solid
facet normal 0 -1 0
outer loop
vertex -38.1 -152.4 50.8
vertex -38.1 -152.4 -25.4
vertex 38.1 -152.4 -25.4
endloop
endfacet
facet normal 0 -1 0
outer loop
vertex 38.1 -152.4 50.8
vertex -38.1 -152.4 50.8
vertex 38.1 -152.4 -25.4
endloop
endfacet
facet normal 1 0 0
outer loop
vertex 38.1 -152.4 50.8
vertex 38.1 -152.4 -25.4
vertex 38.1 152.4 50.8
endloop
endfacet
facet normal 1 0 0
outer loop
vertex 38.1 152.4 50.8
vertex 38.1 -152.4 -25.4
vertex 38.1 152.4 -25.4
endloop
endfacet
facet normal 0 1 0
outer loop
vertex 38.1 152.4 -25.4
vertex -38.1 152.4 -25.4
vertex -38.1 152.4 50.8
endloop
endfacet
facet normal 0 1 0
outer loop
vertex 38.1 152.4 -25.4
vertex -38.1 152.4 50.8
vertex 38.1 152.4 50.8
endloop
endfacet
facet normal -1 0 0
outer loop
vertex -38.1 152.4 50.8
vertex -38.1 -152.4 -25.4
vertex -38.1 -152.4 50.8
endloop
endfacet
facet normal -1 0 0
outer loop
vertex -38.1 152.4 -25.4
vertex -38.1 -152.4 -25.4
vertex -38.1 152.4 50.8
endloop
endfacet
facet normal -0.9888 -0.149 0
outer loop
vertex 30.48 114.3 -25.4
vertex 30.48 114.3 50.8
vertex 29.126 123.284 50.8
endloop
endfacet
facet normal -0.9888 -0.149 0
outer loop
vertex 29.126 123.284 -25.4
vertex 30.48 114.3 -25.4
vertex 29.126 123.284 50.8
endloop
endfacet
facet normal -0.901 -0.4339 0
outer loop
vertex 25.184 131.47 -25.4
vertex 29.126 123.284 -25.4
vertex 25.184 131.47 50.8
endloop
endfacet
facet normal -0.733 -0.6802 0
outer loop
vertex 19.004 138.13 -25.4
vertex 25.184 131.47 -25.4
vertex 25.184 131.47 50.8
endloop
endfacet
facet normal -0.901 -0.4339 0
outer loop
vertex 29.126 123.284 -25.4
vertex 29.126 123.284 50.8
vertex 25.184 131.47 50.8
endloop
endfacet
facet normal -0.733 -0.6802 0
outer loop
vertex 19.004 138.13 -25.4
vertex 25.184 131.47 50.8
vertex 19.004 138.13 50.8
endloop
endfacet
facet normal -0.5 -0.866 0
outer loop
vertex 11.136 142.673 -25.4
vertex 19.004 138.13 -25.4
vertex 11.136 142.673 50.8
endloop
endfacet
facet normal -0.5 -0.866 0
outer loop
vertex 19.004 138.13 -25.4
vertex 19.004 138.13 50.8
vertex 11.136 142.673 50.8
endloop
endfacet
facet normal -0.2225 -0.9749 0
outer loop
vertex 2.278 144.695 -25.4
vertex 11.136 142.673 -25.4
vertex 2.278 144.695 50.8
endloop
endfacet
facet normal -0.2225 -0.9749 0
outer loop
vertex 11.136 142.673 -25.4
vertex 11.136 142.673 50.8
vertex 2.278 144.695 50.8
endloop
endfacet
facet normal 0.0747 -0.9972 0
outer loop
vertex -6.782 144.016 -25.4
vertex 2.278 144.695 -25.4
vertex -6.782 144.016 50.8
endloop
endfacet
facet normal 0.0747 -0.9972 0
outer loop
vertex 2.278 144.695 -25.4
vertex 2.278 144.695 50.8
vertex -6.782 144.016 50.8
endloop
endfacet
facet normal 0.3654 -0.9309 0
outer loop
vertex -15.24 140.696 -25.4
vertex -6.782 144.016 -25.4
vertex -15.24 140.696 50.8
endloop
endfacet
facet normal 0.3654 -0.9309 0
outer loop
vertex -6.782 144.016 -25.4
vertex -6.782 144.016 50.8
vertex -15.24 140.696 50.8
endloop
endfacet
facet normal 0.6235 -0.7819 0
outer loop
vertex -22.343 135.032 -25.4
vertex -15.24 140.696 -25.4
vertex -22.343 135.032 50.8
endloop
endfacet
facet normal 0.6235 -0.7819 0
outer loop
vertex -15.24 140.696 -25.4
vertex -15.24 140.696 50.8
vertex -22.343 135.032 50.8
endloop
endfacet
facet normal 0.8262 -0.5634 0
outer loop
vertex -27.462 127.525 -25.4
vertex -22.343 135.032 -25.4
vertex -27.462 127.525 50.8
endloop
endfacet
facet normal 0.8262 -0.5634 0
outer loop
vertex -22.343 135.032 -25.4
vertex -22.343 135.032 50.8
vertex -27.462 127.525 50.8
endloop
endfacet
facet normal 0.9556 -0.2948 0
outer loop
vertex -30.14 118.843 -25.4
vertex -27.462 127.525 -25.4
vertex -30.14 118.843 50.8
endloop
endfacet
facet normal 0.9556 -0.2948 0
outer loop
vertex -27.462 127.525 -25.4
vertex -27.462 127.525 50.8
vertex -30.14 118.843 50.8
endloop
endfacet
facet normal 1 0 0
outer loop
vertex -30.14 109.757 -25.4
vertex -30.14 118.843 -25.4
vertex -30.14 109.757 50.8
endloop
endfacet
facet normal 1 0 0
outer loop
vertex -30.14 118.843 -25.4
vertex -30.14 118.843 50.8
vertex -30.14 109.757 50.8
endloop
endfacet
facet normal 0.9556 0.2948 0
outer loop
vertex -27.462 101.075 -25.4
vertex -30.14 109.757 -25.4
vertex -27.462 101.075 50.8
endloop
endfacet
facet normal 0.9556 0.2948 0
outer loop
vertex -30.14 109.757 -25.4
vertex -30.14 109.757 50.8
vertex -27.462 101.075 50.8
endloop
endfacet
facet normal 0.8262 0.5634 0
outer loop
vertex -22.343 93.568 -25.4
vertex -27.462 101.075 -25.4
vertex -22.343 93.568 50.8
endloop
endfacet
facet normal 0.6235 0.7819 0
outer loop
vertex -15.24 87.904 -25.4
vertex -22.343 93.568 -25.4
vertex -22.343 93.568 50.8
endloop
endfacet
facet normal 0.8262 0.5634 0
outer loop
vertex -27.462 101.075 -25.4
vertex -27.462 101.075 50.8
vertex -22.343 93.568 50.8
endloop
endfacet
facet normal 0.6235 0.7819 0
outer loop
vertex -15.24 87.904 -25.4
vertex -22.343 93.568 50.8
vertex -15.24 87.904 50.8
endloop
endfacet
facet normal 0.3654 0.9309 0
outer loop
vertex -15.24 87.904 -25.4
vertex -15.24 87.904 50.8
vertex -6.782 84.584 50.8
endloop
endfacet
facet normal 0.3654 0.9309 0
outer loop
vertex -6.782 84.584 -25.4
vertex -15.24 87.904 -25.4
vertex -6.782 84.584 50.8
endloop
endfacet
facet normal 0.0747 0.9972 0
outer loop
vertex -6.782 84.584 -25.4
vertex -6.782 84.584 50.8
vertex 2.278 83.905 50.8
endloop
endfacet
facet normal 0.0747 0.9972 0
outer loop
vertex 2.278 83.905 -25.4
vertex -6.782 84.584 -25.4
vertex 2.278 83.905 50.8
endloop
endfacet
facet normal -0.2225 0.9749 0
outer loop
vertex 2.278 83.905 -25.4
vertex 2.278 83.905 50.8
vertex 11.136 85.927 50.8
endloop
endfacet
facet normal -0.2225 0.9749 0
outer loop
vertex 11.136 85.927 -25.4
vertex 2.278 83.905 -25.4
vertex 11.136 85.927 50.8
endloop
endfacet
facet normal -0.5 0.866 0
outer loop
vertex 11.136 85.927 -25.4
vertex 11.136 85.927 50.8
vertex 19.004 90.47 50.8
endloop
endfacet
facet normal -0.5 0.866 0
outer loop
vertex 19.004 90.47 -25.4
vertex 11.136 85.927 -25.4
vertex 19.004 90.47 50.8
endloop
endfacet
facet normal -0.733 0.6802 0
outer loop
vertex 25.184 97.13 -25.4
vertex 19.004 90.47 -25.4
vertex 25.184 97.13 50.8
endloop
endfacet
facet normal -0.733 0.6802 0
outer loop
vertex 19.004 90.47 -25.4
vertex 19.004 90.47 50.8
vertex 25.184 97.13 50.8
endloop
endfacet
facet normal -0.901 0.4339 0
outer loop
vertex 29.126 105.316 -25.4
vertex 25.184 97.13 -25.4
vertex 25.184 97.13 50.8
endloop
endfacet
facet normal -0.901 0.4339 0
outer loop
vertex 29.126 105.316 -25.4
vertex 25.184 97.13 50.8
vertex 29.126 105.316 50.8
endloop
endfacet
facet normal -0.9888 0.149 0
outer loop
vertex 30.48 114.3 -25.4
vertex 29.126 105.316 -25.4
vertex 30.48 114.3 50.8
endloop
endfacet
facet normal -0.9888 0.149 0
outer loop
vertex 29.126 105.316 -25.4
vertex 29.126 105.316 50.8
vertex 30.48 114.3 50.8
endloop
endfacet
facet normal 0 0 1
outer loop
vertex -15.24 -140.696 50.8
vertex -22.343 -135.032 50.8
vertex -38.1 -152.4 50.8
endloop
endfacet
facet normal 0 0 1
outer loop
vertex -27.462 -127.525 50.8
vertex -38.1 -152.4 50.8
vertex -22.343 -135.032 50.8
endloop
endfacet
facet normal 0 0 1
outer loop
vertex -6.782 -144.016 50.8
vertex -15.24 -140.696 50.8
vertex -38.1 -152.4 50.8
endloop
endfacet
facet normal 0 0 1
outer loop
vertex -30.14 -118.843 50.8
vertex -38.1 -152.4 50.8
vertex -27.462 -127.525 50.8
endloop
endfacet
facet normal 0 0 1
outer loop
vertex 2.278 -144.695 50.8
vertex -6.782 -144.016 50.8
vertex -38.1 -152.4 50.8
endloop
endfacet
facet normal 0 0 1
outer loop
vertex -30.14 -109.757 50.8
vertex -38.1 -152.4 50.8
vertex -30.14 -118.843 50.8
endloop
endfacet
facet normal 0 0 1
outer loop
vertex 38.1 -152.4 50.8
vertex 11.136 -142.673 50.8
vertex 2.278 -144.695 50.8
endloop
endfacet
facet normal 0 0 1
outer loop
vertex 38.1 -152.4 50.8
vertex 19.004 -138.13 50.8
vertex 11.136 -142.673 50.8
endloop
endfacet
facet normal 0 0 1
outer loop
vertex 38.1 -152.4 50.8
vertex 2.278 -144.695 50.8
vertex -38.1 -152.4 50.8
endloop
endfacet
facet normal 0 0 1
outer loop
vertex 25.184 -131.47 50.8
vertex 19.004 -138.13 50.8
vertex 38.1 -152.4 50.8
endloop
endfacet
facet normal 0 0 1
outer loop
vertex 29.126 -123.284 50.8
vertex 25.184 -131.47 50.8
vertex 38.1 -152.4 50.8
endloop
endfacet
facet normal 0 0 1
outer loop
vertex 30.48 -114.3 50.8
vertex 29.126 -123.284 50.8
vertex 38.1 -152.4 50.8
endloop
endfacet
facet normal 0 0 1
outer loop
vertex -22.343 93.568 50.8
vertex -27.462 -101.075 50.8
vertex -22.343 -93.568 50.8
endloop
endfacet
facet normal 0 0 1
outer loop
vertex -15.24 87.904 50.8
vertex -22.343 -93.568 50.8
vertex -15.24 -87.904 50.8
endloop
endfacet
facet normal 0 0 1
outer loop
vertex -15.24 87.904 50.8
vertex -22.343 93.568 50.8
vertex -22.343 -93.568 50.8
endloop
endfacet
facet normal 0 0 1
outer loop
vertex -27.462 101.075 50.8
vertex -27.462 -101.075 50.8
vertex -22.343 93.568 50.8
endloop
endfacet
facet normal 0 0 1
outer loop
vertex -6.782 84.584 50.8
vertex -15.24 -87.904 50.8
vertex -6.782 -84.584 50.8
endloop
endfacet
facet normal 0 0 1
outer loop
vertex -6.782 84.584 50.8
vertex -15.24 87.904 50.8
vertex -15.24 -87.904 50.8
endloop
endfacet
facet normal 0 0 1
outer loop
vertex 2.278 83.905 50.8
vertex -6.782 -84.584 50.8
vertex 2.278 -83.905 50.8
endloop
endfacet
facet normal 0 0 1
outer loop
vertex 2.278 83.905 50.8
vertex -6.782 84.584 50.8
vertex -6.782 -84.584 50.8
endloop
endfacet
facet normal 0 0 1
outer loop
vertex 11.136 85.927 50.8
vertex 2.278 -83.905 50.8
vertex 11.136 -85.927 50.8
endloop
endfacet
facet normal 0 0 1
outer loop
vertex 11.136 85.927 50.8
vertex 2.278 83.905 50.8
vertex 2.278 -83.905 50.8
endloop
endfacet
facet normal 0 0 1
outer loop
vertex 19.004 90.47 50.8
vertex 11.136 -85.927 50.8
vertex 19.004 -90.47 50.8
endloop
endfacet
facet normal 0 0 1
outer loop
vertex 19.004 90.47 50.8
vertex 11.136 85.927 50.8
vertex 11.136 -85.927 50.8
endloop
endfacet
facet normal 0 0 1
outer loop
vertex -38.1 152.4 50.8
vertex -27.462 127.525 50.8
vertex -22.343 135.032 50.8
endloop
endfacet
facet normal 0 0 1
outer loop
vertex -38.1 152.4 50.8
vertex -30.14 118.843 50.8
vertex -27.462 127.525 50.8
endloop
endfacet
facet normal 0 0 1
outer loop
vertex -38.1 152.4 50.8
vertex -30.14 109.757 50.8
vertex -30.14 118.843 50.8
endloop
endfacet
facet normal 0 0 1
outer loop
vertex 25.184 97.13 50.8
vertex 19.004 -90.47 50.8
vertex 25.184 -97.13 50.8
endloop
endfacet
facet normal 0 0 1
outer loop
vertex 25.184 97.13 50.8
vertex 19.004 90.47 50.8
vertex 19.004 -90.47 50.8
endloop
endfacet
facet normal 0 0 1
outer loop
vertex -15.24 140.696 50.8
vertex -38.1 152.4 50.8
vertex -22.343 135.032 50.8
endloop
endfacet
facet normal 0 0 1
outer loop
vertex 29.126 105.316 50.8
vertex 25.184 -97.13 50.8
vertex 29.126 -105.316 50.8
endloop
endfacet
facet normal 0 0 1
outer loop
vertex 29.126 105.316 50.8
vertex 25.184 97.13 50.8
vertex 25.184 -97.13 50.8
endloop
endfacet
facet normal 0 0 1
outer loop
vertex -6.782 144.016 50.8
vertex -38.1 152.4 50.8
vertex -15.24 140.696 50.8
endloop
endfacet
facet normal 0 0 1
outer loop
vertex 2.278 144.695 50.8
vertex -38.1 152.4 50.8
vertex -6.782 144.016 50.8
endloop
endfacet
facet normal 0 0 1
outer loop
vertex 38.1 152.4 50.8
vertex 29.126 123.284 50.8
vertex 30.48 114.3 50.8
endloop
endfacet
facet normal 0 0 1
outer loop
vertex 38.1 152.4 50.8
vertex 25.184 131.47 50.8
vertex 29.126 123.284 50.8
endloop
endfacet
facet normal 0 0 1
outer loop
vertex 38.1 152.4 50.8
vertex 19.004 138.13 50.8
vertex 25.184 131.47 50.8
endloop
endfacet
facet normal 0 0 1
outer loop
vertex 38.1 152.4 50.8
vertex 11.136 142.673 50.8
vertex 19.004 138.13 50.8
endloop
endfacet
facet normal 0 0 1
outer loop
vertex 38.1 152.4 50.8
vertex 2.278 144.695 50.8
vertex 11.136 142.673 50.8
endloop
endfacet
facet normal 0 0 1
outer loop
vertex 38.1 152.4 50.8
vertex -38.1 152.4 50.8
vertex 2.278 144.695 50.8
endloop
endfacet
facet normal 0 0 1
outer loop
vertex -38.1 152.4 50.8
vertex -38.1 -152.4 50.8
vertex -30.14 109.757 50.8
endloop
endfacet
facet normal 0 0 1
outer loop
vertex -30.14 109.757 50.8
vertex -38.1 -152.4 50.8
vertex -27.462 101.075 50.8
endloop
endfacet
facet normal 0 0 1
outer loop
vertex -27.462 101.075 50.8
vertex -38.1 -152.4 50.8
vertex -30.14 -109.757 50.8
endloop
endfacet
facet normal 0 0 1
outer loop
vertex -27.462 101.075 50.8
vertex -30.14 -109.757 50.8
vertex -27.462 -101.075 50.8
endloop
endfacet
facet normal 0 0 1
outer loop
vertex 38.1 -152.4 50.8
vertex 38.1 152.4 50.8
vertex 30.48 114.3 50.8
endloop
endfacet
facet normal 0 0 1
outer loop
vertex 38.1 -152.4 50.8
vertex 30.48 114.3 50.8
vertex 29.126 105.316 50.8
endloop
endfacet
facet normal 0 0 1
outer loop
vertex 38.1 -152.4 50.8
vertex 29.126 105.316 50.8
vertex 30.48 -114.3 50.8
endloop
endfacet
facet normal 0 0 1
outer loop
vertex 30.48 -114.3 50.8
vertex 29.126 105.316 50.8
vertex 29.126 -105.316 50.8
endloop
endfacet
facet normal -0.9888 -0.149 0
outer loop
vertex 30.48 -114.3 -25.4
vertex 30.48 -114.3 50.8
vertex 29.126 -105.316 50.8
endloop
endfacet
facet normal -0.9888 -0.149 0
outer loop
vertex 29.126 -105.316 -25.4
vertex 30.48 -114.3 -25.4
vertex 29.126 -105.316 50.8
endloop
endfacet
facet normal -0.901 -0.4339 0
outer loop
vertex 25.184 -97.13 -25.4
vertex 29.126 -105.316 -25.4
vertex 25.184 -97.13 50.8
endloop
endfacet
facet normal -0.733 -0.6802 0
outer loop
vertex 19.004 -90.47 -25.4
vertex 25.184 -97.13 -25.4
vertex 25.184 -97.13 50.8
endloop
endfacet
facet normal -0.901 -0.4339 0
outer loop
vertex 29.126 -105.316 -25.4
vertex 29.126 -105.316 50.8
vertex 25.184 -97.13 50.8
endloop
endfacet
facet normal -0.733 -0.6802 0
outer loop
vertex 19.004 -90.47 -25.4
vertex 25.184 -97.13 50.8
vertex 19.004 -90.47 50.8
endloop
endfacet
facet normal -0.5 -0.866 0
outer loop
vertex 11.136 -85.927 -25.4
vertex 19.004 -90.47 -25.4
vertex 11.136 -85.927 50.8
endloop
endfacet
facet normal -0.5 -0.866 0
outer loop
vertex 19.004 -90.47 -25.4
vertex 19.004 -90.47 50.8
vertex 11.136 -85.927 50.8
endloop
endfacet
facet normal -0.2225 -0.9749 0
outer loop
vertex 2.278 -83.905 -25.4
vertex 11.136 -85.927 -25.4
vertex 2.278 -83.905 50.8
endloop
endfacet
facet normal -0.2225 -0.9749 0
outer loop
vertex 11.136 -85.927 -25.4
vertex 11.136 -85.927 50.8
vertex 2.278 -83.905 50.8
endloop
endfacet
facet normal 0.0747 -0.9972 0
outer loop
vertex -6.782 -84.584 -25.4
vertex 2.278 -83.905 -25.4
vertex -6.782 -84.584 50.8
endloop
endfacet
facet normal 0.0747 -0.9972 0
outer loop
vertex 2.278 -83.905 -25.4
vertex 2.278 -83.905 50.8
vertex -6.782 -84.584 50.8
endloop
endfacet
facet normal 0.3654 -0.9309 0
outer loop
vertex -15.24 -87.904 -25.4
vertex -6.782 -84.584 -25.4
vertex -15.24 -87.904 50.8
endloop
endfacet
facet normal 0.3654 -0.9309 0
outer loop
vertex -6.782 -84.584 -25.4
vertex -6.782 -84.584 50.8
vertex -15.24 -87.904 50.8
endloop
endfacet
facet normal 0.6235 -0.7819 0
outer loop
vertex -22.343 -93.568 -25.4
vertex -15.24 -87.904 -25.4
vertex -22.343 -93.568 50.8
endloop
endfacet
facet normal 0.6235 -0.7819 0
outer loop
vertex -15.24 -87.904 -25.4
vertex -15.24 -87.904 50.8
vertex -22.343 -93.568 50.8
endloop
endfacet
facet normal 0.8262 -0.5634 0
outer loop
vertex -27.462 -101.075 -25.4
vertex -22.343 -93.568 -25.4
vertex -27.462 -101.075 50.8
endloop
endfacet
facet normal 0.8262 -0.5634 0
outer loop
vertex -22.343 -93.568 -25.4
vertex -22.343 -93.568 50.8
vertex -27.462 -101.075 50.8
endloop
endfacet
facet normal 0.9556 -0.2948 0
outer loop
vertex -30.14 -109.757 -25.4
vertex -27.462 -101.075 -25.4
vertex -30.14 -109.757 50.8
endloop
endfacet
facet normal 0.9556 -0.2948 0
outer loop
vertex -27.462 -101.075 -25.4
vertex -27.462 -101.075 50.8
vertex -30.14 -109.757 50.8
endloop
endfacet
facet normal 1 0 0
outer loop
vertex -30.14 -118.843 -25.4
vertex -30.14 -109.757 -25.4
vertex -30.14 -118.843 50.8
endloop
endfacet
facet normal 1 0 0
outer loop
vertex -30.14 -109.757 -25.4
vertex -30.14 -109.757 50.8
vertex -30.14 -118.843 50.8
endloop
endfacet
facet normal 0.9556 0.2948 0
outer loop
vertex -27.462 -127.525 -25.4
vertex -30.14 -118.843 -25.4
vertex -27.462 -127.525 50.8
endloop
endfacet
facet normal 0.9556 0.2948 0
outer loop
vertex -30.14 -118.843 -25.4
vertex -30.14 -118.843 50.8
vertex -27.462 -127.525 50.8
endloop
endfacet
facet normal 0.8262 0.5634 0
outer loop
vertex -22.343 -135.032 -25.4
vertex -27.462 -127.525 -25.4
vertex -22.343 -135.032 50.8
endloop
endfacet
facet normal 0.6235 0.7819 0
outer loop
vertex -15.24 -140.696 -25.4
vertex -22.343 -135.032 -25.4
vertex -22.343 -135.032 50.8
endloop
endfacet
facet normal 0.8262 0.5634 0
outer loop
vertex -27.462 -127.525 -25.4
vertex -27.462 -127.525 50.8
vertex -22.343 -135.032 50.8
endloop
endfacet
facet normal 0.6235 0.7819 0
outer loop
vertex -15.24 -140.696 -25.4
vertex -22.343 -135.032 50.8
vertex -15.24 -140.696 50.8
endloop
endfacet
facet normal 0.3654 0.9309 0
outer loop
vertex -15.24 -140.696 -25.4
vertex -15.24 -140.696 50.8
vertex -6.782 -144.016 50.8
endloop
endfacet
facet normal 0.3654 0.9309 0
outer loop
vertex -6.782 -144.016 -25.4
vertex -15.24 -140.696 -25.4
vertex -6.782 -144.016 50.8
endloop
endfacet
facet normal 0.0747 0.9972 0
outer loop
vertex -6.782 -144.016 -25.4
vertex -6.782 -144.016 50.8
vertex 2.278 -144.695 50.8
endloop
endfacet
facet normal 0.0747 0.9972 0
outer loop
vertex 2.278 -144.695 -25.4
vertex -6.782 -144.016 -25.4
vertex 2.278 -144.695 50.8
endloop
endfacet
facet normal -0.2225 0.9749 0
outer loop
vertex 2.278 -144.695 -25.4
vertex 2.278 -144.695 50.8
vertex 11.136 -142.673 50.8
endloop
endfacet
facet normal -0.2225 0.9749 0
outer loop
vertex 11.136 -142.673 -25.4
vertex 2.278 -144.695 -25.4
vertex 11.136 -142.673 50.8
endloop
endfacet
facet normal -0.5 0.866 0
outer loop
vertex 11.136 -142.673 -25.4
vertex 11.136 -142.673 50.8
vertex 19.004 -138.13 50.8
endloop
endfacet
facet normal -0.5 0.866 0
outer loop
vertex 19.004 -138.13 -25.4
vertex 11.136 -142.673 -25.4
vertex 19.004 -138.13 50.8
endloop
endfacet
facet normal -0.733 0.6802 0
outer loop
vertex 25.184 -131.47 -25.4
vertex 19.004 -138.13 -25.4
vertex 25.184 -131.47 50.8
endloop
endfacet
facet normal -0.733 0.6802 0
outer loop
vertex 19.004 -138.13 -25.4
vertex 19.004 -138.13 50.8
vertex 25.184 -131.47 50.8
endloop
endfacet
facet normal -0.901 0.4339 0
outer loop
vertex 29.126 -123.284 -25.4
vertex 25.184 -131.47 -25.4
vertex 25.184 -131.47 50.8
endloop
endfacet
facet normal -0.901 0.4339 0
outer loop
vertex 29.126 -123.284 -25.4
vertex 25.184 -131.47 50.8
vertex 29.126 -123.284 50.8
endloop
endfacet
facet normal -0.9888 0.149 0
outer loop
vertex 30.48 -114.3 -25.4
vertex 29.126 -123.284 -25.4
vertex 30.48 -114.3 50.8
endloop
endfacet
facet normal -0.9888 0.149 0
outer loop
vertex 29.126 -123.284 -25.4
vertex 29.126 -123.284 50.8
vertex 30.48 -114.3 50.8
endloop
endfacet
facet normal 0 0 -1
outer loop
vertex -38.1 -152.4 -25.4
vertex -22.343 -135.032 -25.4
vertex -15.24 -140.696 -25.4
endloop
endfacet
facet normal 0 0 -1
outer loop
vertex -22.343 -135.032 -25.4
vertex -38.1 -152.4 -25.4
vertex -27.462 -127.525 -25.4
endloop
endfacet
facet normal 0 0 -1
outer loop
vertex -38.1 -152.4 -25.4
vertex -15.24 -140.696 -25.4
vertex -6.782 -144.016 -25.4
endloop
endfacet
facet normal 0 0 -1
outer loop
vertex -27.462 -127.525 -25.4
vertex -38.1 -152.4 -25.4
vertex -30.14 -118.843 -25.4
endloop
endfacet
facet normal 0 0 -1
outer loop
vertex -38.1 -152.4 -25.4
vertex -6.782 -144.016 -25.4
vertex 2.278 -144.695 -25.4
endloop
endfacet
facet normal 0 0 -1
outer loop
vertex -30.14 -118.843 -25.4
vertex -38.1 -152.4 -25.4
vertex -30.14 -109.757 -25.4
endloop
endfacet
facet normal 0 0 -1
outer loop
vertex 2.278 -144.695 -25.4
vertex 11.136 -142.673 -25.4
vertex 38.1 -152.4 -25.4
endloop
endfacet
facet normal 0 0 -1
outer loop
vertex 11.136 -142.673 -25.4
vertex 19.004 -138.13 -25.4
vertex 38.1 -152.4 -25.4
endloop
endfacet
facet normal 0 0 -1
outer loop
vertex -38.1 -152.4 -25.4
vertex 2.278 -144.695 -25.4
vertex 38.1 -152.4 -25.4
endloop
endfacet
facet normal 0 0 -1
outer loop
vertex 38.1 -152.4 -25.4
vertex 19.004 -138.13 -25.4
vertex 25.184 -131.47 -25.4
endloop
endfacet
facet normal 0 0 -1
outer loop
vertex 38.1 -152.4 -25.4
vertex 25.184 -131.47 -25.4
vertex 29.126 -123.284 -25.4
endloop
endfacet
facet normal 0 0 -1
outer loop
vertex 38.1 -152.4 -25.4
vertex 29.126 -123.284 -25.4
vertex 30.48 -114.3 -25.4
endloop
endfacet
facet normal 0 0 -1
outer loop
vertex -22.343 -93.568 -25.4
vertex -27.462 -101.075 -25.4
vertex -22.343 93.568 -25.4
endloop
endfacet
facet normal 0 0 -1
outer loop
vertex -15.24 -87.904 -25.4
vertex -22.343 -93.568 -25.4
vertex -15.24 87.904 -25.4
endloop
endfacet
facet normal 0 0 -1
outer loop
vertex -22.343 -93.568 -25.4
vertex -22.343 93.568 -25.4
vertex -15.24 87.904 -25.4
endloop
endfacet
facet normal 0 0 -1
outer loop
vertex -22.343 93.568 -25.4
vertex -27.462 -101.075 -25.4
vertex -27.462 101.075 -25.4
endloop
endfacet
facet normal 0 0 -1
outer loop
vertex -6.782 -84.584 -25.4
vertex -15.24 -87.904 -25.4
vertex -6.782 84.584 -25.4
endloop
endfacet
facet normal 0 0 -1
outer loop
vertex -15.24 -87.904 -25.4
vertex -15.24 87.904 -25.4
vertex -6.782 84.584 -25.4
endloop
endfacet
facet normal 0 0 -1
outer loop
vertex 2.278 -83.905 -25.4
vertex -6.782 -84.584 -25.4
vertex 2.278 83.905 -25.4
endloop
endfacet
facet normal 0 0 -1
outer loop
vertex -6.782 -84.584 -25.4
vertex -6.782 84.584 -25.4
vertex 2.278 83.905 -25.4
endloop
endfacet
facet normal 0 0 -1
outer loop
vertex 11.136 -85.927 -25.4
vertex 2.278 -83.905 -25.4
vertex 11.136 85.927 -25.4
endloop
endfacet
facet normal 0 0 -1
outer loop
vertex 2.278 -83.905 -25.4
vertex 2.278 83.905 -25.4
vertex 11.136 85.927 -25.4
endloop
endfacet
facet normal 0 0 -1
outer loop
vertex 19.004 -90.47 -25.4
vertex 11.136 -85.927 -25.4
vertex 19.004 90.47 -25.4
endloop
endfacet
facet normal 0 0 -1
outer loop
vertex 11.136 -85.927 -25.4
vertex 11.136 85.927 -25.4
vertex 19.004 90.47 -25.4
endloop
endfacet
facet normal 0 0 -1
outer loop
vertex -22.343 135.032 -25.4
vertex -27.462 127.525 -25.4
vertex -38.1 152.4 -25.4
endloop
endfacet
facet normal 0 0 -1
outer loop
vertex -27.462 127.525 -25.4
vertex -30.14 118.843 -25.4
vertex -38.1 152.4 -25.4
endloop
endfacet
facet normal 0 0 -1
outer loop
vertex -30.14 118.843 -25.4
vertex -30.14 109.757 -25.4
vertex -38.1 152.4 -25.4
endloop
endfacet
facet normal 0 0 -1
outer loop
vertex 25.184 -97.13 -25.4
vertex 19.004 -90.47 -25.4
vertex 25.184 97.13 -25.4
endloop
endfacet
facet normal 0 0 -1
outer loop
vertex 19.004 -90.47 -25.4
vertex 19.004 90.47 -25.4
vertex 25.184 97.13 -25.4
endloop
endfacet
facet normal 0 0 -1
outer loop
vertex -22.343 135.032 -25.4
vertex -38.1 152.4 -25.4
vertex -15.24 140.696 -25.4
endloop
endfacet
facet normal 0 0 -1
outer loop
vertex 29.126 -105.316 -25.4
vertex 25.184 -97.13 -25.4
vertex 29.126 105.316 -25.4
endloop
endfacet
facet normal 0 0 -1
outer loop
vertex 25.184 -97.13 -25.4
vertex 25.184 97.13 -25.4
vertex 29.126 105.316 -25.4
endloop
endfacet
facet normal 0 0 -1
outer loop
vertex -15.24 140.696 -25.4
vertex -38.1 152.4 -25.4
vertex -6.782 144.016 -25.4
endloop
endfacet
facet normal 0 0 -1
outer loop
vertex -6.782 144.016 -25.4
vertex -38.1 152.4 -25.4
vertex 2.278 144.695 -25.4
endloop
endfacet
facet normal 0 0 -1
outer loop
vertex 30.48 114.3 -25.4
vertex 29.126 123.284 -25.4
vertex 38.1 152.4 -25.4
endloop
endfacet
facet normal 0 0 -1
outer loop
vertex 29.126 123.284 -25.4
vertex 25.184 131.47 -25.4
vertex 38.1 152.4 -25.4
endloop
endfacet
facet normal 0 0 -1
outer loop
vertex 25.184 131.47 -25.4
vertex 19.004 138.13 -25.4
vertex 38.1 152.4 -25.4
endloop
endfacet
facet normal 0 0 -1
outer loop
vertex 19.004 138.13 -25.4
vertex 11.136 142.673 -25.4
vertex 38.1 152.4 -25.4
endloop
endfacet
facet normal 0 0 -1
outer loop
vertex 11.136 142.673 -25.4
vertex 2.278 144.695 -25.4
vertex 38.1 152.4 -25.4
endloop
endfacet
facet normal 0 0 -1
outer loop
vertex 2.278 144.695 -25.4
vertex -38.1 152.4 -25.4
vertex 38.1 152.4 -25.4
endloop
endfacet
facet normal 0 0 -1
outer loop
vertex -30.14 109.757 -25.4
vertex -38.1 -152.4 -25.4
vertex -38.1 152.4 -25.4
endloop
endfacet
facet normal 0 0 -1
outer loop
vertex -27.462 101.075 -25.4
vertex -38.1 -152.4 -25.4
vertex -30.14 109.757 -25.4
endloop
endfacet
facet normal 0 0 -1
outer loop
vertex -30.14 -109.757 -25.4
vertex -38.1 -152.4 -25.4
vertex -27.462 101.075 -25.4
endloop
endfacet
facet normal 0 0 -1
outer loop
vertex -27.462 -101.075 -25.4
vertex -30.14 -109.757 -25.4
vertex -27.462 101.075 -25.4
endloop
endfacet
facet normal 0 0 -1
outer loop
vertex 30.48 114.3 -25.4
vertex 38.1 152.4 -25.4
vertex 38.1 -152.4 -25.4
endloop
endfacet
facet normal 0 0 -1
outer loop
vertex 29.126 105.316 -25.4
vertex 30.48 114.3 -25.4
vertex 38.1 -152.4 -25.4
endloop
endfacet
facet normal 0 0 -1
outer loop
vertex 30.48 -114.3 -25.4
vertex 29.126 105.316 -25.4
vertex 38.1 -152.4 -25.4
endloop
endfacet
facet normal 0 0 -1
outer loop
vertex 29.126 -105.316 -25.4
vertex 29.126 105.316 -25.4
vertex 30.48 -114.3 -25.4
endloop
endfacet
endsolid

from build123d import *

# Parameters (mm, degrees)
SKETCH1_W           = 25.4
SKETCH1_H           = 101.6
BOSS_EXTRUDE1_DEPTH = 25.4
SKETCH2_R           = 10.16
CUT_EXTRUDE1_DEPTH  = 25.4
SCALE1_SCALE        = 3


with BuildPart() as part:
    # Sketch1 → Boss-Extrude1 (new body)
    with BuildSketch(Plane.XY):
        Rectangle(SKETCH1_W, SKETCH1_H)
    extrude(amount=BOSS_EXTRUDE1_DEPTH)

    # Sketch2 → Cut-Extrude1 (cut)
    with BuildSketch(Plane.XY.offset(25.4)):
        with Locations((0, -38.1)):
            Circle(SKETCH2_R)
        with Locations((0, 38.1)):
            Circle(SKETCH2_R)
    extrude(amount=-CUT_EXTRUDE1_DEPTH, mode=Mode.SUBTRACT)


with BuildPart() as part_1:
    # Scale1: scaled about (0, 0, 12.7)
    add(part.part.scale(SCALE1_SCALE).moved(Location((0, 0, -25.4))))


solid = part_1.part
